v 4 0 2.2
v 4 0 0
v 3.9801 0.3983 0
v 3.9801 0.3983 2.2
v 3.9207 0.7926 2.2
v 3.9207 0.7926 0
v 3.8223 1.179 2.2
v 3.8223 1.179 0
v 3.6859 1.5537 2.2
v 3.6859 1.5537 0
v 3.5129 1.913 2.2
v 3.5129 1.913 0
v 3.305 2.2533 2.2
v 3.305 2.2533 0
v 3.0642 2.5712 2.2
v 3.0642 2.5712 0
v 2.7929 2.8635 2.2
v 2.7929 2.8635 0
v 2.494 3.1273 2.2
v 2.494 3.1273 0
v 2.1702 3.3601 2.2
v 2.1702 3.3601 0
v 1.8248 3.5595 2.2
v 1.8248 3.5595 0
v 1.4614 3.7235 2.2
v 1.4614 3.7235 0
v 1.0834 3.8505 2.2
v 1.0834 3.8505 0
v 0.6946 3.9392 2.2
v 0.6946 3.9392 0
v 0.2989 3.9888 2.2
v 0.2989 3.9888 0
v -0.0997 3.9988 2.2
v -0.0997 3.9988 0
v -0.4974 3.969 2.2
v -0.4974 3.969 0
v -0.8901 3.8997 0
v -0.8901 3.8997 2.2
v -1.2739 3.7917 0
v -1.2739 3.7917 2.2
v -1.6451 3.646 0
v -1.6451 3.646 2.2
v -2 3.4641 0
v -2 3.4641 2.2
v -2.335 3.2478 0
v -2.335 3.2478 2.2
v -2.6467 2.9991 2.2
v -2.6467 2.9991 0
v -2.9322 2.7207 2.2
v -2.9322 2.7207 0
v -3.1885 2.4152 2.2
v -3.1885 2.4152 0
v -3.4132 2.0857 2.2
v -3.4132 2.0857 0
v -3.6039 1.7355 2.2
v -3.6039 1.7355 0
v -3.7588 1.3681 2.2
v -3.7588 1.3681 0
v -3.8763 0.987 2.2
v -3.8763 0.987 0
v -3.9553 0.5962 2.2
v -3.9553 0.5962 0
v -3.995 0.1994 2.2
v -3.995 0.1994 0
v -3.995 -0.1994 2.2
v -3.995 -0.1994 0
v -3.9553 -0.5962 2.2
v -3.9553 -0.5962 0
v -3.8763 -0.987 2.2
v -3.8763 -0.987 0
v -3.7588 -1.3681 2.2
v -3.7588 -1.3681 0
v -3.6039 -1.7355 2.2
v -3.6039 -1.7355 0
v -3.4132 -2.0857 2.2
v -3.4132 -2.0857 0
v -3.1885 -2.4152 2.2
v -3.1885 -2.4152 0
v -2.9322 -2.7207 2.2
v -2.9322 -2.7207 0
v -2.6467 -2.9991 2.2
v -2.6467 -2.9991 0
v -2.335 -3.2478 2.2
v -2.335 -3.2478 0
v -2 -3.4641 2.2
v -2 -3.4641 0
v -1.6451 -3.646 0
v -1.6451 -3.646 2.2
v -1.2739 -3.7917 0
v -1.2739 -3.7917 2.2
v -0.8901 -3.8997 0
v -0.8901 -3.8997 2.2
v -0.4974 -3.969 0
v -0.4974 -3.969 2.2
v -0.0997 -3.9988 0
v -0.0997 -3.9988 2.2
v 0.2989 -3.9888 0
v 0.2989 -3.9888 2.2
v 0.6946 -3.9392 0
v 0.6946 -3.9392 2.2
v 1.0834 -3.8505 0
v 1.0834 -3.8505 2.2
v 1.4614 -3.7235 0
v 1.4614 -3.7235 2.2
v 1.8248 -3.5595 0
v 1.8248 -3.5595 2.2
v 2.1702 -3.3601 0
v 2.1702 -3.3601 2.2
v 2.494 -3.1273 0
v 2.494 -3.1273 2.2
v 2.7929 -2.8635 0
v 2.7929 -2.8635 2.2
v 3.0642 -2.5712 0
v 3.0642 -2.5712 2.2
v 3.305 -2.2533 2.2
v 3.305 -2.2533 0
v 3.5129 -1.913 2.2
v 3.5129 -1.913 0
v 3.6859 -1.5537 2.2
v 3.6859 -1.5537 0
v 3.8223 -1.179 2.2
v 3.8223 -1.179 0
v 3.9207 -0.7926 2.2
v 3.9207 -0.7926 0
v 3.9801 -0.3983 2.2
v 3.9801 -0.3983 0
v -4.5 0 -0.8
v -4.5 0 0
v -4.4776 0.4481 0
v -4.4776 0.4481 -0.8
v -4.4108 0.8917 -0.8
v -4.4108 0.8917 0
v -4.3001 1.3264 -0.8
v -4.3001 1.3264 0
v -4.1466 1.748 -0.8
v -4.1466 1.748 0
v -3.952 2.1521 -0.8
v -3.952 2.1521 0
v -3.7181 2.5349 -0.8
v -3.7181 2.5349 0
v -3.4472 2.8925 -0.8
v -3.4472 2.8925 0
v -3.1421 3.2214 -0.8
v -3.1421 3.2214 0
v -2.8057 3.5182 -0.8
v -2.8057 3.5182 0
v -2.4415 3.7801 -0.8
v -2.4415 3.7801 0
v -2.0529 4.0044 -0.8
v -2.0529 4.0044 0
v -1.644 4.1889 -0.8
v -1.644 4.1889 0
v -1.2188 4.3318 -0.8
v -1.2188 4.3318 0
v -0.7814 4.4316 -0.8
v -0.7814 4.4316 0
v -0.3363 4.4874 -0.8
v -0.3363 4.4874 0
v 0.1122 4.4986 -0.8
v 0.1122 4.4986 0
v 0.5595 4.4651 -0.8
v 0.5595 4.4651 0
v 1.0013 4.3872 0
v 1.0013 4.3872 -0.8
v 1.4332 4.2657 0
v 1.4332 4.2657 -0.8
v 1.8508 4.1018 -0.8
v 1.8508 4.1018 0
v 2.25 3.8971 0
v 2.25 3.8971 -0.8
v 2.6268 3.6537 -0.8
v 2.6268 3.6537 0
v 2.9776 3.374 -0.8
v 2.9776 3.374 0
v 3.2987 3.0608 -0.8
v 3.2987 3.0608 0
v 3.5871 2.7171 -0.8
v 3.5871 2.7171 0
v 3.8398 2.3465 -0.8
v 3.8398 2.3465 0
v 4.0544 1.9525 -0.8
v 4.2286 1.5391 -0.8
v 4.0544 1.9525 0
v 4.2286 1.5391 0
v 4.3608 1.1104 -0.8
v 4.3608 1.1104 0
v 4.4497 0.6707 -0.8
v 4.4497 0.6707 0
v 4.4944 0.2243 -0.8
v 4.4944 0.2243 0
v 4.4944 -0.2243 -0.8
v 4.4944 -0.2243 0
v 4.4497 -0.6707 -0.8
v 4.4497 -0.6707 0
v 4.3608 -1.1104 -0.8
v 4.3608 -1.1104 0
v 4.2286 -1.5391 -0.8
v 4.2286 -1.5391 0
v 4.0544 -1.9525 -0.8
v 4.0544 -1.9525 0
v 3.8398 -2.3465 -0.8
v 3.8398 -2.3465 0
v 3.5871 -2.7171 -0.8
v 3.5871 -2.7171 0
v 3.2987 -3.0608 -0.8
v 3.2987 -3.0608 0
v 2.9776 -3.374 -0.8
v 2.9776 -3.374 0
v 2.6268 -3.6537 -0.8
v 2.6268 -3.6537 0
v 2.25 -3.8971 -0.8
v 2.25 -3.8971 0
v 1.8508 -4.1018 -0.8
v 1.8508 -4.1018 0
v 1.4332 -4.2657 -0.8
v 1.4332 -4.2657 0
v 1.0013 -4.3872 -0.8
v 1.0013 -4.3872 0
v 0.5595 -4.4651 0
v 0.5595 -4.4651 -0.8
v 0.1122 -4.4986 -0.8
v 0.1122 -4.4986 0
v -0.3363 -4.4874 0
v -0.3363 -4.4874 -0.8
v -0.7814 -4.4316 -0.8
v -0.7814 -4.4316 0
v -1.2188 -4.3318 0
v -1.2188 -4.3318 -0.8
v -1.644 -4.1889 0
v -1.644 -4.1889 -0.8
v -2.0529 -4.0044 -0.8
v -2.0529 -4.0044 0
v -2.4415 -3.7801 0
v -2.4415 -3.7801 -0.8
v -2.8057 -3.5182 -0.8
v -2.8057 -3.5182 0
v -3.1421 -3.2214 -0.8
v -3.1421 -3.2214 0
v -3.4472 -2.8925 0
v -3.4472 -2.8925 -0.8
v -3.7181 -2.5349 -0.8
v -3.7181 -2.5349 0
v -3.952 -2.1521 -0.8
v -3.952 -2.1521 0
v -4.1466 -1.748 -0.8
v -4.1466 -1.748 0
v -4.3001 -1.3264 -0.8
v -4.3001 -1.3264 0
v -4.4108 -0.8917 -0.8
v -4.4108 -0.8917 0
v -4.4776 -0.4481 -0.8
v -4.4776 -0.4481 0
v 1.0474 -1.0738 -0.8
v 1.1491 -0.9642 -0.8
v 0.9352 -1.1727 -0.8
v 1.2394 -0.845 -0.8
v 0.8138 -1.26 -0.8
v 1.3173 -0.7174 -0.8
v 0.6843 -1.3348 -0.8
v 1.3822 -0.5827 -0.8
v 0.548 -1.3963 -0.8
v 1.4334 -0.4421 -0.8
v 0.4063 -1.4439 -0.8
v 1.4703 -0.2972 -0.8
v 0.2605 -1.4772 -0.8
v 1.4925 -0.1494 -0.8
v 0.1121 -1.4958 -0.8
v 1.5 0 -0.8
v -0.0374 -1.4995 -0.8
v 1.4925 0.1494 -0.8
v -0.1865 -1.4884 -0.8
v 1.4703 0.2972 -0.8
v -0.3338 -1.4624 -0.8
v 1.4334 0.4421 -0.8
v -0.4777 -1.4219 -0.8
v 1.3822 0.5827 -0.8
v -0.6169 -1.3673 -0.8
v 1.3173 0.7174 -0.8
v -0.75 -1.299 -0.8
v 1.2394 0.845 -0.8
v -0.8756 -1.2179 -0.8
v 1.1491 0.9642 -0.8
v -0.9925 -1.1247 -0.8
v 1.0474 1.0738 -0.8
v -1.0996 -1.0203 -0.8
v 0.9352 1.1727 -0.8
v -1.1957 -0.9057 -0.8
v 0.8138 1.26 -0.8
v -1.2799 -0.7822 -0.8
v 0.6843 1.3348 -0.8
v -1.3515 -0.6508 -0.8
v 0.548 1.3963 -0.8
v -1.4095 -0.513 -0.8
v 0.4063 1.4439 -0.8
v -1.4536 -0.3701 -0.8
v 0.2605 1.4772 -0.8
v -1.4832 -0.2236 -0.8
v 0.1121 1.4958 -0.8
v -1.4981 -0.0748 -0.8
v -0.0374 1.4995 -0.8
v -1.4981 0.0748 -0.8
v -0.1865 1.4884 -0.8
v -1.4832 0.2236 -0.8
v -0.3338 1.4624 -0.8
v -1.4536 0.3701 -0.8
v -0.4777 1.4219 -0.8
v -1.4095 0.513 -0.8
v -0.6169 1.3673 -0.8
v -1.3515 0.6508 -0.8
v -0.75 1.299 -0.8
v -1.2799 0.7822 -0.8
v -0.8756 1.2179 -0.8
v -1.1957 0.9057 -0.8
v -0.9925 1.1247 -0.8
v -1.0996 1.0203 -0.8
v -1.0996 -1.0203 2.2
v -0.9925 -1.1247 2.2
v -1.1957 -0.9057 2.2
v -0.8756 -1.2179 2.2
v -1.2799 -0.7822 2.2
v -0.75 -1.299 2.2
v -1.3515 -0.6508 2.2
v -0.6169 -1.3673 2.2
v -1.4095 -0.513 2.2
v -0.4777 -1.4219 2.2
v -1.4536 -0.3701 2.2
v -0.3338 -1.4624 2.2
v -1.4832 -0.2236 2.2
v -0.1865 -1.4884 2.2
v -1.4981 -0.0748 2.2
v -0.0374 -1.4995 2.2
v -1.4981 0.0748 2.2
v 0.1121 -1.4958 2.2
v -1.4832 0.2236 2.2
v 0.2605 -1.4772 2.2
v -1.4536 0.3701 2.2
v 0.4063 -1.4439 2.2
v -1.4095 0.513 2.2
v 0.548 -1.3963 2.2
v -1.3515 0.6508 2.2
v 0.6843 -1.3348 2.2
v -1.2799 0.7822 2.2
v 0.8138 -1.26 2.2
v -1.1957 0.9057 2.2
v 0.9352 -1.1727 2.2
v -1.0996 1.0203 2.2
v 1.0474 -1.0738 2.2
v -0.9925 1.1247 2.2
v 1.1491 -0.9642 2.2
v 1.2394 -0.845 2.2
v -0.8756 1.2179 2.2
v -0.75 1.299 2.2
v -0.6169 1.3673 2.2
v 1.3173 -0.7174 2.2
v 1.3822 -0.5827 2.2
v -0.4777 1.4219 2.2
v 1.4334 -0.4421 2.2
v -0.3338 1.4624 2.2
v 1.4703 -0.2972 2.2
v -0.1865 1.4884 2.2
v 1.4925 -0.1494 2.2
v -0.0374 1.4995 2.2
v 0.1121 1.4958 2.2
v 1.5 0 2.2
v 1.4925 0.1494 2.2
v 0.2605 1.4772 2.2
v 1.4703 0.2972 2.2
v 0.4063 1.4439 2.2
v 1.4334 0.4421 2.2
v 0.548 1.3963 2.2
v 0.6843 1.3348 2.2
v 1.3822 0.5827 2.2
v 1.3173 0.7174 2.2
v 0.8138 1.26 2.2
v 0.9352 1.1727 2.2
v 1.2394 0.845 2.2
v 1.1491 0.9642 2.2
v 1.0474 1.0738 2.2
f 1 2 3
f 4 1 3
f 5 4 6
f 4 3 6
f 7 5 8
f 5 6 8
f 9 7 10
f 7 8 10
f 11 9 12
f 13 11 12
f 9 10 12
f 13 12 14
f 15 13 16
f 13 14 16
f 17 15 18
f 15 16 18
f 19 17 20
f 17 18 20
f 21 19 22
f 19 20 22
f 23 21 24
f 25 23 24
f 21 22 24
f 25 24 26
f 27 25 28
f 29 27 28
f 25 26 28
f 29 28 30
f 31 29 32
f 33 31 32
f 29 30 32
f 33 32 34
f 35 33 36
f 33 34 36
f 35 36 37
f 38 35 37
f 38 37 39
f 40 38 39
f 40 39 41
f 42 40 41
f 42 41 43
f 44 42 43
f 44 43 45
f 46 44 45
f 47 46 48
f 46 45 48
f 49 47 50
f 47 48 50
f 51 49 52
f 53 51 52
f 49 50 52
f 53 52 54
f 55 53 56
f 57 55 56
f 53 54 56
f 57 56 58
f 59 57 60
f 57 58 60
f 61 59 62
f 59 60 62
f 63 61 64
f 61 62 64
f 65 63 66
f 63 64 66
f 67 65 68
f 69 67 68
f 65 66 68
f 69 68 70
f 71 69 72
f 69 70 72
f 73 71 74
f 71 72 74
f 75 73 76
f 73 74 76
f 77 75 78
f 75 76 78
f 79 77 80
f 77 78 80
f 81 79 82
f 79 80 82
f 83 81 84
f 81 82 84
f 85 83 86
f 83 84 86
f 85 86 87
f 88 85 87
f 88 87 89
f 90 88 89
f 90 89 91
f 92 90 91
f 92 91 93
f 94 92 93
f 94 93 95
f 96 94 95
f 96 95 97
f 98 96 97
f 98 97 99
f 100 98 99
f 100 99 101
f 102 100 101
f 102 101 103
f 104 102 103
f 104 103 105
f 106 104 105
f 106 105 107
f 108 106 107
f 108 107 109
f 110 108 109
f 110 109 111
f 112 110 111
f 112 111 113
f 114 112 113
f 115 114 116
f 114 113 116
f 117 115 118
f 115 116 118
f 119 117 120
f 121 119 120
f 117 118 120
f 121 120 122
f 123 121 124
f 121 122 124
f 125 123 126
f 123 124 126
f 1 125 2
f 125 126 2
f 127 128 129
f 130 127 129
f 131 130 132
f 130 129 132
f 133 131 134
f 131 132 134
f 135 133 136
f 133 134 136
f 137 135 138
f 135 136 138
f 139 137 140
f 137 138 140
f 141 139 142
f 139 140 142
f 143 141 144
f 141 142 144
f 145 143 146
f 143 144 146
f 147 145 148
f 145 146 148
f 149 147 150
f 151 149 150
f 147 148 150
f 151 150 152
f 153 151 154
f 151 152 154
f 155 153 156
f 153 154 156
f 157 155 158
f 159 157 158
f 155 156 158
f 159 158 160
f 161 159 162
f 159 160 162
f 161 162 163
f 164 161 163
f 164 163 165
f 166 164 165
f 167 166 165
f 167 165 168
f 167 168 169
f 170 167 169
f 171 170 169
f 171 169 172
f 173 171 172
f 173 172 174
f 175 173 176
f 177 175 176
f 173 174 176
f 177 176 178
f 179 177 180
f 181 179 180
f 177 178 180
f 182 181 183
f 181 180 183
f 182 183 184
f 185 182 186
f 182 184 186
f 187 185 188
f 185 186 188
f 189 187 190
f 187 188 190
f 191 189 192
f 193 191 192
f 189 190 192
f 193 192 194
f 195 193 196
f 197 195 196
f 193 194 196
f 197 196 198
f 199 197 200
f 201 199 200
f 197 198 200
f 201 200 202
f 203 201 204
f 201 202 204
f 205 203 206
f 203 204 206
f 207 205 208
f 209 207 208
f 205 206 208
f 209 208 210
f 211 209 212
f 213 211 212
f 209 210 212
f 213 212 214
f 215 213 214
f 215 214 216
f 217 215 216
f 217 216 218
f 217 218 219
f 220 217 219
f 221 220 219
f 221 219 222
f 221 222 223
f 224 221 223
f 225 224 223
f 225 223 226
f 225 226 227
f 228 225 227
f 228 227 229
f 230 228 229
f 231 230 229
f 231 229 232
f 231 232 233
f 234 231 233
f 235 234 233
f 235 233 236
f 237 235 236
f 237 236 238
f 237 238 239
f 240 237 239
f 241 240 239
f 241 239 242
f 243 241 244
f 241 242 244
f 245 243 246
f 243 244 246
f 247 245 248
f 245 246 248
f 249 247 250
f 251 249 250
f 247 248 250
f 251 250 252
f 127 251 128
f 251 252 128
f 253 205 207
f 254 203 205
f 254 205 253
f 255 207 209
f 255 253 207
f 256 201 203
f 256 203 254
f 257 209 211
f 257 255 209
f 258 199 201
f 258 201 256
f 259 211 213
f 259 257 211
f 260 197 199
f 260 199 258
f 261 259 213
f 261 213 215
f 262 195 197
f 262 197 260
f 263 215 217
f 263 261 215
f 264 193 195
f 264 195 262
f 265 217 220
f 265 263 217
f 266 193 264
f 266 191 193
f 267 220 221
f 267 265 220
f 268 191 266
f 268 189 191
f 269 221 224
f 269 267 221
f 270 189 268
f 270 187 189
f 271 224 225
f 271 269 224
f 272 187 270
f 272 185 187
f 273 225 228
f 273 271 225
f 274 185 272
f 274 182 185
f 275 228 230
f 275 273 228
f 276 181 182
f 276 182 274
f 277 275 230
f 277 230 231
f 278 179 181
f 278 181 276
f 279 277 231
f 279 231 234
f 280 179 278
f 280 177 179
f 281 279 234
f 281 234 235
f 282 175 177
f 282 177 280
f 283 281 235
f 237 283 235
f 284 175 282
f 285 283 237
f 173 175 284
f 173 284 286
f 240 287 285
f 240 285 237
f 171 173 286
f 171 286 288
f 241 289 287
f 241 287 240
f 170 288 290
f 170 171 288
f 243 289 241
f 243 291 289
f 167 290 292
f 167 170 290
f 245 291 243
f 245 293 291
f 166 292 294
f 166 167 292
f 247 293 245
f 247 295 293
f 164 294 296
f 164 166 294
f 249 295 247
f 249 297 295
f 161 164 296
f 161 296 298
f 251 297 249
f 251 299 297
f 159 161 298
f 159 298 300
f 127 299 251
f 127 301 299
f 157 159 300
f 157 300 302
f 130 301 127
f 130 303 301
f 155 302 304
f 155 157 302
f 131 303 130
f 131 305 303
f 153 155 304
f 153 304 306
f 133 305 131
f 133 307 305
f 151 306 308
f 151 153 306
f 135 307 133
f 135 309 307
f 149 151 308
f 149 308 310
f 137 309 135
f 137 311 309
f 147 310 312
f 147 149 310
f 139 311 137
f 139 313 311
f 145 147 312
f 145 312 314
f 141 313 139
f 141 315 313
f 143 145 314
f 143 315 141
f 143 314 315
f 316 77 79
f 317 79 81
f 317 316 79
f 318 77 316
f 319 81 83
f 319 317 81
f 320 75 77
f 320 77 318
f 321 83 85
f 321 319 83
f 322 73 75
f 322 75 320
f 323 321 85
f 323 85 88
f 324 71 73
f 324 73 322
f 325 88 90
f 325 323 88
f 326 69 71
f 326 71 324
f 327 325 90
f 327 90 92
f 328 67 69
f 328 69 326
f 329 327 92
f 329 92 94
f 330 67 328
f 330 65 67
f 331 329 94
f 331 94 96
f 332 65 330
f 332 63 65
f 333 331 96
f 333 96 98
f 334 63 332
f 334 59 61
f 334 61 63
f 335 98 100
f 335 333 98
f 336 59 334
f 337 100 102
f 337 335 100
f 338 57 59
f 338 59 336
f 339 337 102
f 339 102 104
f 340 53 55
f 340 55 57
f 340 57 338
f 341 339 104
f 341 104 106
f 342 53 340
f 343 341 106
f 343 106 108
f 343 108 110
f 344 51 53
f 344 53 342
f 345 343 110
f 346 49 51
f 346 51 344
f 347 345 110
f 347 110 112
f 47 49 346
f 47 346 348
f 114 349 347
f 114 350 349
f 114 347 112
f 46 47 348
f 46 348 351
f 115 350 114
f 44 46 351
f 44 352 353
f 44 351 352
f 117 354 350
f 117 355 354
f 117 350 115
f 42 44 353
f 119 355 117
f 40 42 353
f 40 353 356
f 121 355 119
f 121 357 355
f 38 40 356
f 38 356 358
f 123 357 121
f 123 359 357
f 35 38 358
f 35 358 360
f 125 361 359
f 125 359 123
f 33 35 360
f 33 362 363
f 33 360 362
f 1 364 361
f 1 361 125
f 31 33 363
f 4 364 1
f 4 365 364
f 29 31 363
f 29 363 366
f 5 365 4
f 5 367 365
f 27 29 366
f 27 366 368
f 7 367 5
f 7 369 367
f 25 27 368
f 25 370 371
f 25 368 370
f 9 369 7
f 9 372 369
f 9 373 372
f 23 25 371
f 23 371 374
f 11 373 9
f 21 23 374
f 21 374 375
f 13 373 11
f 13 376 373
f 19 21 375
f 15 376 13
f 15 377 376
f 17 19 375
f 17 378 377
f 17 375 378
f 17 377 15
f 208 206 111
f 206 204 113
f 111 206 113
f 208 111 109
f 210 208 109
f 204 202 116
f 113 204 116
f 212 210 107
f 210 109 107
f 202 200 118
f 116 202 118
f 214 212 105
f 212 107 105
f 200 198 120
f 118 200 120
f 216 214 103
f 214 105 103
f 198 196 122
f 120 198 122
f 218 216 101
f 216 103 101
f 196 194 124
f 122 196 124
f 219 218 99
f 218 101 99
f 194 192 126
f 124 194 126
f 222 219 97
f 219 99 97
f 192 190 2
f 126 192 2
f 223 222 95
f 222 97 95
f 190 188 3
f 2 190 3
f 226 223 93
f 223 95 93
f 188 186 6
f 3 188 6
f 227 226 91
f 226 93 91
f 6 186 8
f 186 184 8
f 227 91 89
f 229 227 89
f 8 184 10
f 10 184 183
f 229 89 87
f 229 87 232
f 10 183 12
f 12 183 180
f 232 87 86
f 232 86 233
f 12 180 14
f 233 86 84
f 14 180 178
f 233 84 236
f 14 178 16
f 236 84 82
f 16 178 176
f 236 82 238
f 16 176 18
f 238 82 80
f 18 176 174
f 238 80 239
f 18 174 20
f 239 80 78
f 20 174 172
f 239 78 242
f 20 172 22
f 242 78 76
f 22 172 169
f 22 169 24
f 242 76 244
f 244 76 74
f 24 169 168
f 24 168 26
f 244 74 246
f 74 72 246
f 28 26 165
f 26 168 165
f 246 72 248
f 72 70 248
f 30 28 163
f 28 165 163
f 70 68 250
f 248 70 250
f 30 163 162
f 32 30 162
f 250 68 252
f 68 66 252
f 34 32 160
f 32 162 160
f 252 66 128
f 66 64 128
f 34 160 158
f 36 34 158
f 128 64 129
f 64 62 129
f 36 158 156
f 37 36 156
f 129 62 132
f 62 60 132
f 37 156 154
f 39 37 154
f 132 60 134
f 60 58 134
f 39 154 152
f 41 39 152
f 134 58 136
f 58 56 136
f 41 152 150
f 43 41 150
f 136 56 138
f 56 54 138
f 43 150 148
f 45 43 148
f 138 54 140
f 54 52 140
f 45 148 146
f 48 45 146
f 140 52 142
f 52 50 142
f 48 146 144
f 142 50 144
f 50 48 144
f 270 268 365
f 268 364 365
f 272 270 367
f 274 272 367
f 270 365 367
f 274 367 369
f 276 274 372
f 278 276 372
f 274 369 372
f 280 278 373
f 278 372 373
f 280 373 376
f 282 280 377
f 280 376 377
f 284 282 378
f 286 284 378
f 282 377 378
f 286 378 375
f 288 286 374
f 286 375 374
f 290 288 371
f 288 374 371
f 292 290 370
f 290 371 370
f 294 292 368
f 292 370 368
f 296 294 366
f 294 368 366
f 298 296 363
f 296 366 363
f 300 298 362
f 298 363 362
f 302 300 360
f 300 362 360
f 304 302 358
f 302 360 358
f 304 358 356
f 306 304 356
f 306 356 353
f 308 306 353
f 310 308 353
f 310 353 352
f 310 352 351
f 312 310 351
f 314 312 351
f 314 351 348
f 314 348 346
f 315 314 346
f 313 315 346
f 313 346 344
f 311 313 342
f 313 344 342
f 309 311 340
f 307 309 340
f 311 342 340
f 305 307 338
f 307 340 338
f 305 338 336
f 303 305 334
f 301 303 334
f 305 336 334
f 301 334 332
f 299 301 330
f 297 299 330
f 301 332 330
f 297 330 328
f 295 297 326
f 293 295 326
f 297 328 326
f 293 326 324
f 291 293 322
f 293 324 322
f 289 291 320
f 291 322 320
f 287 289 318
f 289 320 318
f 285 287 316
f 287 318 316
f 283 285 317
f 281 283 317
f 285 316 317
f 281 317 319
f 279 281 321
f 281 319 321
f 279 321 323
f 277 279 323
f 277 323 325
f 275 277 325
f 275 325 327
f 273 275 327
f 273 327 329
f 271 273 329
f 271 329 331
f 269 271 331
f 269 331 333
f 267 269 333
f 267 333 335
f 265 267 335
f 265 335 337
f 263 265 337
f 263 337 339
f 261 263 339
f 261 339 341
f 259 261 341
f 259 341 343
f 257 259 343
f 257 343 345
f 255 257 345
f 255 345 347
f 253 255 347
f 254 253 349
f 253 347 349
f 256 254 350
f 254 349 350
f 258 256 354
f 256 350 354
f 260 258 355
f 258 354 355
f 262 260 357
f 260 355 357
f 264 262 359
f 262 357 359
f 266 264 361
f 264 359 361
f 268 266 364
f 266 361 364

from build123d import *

# Parameters (mm, degrees)
SKETCH_1_R          = 4
EXTRUDE_1_DEPTH     = 2.2
SKETCH_2_R          = 1.5
CUT_EXTRUDE_1_DEPTH = 7
SKETCH_3_R          = 4.5
EXTRUDE_2_DEPTH     = 0.8
SKETCH_4_R          = 1.5
CUT_EXTRUDE_2_DEPTH = 0.8


with BuildPart() as part:
    # 草图1 → 凸台-拉伸1 (new body)
    with BuildSketch(Plane.XY):
        Circle(SKETCH_1_R)
    extrude(amount=EXTRUDE_1_DEPTH)

    # 草图2 → 切除-拉伸1 (cut)
    with BuildSketch(Plane.XY.offset(2.2)):
        Circle(SKETCH_2_R)
    extrude(amount=-CUT_EXTRUDE_1_DEPTH, mode=Mode.SUBTRACT)

    # 草图3 → 凸台-拉伸2 (add)
    with BuildSketch(Plane(origin=(0, 0, 0), x_dir=(-1, 0, 0), z_dir=(0, 0, -1))):
        Circle(SKETCH_3_R)
    extrude(amount=EXTRUDE_2_DEPTH)

    # 草图4 → 切除-拉伸2 (cut)
    with BuildSketch(Plane.XY):
        Circle(SKETCH_4_R)
    extrude(amount=-CUT_EXTRUDE_2_DEPTH, mode=Mode.SUBTRACT)


solid = part.part
